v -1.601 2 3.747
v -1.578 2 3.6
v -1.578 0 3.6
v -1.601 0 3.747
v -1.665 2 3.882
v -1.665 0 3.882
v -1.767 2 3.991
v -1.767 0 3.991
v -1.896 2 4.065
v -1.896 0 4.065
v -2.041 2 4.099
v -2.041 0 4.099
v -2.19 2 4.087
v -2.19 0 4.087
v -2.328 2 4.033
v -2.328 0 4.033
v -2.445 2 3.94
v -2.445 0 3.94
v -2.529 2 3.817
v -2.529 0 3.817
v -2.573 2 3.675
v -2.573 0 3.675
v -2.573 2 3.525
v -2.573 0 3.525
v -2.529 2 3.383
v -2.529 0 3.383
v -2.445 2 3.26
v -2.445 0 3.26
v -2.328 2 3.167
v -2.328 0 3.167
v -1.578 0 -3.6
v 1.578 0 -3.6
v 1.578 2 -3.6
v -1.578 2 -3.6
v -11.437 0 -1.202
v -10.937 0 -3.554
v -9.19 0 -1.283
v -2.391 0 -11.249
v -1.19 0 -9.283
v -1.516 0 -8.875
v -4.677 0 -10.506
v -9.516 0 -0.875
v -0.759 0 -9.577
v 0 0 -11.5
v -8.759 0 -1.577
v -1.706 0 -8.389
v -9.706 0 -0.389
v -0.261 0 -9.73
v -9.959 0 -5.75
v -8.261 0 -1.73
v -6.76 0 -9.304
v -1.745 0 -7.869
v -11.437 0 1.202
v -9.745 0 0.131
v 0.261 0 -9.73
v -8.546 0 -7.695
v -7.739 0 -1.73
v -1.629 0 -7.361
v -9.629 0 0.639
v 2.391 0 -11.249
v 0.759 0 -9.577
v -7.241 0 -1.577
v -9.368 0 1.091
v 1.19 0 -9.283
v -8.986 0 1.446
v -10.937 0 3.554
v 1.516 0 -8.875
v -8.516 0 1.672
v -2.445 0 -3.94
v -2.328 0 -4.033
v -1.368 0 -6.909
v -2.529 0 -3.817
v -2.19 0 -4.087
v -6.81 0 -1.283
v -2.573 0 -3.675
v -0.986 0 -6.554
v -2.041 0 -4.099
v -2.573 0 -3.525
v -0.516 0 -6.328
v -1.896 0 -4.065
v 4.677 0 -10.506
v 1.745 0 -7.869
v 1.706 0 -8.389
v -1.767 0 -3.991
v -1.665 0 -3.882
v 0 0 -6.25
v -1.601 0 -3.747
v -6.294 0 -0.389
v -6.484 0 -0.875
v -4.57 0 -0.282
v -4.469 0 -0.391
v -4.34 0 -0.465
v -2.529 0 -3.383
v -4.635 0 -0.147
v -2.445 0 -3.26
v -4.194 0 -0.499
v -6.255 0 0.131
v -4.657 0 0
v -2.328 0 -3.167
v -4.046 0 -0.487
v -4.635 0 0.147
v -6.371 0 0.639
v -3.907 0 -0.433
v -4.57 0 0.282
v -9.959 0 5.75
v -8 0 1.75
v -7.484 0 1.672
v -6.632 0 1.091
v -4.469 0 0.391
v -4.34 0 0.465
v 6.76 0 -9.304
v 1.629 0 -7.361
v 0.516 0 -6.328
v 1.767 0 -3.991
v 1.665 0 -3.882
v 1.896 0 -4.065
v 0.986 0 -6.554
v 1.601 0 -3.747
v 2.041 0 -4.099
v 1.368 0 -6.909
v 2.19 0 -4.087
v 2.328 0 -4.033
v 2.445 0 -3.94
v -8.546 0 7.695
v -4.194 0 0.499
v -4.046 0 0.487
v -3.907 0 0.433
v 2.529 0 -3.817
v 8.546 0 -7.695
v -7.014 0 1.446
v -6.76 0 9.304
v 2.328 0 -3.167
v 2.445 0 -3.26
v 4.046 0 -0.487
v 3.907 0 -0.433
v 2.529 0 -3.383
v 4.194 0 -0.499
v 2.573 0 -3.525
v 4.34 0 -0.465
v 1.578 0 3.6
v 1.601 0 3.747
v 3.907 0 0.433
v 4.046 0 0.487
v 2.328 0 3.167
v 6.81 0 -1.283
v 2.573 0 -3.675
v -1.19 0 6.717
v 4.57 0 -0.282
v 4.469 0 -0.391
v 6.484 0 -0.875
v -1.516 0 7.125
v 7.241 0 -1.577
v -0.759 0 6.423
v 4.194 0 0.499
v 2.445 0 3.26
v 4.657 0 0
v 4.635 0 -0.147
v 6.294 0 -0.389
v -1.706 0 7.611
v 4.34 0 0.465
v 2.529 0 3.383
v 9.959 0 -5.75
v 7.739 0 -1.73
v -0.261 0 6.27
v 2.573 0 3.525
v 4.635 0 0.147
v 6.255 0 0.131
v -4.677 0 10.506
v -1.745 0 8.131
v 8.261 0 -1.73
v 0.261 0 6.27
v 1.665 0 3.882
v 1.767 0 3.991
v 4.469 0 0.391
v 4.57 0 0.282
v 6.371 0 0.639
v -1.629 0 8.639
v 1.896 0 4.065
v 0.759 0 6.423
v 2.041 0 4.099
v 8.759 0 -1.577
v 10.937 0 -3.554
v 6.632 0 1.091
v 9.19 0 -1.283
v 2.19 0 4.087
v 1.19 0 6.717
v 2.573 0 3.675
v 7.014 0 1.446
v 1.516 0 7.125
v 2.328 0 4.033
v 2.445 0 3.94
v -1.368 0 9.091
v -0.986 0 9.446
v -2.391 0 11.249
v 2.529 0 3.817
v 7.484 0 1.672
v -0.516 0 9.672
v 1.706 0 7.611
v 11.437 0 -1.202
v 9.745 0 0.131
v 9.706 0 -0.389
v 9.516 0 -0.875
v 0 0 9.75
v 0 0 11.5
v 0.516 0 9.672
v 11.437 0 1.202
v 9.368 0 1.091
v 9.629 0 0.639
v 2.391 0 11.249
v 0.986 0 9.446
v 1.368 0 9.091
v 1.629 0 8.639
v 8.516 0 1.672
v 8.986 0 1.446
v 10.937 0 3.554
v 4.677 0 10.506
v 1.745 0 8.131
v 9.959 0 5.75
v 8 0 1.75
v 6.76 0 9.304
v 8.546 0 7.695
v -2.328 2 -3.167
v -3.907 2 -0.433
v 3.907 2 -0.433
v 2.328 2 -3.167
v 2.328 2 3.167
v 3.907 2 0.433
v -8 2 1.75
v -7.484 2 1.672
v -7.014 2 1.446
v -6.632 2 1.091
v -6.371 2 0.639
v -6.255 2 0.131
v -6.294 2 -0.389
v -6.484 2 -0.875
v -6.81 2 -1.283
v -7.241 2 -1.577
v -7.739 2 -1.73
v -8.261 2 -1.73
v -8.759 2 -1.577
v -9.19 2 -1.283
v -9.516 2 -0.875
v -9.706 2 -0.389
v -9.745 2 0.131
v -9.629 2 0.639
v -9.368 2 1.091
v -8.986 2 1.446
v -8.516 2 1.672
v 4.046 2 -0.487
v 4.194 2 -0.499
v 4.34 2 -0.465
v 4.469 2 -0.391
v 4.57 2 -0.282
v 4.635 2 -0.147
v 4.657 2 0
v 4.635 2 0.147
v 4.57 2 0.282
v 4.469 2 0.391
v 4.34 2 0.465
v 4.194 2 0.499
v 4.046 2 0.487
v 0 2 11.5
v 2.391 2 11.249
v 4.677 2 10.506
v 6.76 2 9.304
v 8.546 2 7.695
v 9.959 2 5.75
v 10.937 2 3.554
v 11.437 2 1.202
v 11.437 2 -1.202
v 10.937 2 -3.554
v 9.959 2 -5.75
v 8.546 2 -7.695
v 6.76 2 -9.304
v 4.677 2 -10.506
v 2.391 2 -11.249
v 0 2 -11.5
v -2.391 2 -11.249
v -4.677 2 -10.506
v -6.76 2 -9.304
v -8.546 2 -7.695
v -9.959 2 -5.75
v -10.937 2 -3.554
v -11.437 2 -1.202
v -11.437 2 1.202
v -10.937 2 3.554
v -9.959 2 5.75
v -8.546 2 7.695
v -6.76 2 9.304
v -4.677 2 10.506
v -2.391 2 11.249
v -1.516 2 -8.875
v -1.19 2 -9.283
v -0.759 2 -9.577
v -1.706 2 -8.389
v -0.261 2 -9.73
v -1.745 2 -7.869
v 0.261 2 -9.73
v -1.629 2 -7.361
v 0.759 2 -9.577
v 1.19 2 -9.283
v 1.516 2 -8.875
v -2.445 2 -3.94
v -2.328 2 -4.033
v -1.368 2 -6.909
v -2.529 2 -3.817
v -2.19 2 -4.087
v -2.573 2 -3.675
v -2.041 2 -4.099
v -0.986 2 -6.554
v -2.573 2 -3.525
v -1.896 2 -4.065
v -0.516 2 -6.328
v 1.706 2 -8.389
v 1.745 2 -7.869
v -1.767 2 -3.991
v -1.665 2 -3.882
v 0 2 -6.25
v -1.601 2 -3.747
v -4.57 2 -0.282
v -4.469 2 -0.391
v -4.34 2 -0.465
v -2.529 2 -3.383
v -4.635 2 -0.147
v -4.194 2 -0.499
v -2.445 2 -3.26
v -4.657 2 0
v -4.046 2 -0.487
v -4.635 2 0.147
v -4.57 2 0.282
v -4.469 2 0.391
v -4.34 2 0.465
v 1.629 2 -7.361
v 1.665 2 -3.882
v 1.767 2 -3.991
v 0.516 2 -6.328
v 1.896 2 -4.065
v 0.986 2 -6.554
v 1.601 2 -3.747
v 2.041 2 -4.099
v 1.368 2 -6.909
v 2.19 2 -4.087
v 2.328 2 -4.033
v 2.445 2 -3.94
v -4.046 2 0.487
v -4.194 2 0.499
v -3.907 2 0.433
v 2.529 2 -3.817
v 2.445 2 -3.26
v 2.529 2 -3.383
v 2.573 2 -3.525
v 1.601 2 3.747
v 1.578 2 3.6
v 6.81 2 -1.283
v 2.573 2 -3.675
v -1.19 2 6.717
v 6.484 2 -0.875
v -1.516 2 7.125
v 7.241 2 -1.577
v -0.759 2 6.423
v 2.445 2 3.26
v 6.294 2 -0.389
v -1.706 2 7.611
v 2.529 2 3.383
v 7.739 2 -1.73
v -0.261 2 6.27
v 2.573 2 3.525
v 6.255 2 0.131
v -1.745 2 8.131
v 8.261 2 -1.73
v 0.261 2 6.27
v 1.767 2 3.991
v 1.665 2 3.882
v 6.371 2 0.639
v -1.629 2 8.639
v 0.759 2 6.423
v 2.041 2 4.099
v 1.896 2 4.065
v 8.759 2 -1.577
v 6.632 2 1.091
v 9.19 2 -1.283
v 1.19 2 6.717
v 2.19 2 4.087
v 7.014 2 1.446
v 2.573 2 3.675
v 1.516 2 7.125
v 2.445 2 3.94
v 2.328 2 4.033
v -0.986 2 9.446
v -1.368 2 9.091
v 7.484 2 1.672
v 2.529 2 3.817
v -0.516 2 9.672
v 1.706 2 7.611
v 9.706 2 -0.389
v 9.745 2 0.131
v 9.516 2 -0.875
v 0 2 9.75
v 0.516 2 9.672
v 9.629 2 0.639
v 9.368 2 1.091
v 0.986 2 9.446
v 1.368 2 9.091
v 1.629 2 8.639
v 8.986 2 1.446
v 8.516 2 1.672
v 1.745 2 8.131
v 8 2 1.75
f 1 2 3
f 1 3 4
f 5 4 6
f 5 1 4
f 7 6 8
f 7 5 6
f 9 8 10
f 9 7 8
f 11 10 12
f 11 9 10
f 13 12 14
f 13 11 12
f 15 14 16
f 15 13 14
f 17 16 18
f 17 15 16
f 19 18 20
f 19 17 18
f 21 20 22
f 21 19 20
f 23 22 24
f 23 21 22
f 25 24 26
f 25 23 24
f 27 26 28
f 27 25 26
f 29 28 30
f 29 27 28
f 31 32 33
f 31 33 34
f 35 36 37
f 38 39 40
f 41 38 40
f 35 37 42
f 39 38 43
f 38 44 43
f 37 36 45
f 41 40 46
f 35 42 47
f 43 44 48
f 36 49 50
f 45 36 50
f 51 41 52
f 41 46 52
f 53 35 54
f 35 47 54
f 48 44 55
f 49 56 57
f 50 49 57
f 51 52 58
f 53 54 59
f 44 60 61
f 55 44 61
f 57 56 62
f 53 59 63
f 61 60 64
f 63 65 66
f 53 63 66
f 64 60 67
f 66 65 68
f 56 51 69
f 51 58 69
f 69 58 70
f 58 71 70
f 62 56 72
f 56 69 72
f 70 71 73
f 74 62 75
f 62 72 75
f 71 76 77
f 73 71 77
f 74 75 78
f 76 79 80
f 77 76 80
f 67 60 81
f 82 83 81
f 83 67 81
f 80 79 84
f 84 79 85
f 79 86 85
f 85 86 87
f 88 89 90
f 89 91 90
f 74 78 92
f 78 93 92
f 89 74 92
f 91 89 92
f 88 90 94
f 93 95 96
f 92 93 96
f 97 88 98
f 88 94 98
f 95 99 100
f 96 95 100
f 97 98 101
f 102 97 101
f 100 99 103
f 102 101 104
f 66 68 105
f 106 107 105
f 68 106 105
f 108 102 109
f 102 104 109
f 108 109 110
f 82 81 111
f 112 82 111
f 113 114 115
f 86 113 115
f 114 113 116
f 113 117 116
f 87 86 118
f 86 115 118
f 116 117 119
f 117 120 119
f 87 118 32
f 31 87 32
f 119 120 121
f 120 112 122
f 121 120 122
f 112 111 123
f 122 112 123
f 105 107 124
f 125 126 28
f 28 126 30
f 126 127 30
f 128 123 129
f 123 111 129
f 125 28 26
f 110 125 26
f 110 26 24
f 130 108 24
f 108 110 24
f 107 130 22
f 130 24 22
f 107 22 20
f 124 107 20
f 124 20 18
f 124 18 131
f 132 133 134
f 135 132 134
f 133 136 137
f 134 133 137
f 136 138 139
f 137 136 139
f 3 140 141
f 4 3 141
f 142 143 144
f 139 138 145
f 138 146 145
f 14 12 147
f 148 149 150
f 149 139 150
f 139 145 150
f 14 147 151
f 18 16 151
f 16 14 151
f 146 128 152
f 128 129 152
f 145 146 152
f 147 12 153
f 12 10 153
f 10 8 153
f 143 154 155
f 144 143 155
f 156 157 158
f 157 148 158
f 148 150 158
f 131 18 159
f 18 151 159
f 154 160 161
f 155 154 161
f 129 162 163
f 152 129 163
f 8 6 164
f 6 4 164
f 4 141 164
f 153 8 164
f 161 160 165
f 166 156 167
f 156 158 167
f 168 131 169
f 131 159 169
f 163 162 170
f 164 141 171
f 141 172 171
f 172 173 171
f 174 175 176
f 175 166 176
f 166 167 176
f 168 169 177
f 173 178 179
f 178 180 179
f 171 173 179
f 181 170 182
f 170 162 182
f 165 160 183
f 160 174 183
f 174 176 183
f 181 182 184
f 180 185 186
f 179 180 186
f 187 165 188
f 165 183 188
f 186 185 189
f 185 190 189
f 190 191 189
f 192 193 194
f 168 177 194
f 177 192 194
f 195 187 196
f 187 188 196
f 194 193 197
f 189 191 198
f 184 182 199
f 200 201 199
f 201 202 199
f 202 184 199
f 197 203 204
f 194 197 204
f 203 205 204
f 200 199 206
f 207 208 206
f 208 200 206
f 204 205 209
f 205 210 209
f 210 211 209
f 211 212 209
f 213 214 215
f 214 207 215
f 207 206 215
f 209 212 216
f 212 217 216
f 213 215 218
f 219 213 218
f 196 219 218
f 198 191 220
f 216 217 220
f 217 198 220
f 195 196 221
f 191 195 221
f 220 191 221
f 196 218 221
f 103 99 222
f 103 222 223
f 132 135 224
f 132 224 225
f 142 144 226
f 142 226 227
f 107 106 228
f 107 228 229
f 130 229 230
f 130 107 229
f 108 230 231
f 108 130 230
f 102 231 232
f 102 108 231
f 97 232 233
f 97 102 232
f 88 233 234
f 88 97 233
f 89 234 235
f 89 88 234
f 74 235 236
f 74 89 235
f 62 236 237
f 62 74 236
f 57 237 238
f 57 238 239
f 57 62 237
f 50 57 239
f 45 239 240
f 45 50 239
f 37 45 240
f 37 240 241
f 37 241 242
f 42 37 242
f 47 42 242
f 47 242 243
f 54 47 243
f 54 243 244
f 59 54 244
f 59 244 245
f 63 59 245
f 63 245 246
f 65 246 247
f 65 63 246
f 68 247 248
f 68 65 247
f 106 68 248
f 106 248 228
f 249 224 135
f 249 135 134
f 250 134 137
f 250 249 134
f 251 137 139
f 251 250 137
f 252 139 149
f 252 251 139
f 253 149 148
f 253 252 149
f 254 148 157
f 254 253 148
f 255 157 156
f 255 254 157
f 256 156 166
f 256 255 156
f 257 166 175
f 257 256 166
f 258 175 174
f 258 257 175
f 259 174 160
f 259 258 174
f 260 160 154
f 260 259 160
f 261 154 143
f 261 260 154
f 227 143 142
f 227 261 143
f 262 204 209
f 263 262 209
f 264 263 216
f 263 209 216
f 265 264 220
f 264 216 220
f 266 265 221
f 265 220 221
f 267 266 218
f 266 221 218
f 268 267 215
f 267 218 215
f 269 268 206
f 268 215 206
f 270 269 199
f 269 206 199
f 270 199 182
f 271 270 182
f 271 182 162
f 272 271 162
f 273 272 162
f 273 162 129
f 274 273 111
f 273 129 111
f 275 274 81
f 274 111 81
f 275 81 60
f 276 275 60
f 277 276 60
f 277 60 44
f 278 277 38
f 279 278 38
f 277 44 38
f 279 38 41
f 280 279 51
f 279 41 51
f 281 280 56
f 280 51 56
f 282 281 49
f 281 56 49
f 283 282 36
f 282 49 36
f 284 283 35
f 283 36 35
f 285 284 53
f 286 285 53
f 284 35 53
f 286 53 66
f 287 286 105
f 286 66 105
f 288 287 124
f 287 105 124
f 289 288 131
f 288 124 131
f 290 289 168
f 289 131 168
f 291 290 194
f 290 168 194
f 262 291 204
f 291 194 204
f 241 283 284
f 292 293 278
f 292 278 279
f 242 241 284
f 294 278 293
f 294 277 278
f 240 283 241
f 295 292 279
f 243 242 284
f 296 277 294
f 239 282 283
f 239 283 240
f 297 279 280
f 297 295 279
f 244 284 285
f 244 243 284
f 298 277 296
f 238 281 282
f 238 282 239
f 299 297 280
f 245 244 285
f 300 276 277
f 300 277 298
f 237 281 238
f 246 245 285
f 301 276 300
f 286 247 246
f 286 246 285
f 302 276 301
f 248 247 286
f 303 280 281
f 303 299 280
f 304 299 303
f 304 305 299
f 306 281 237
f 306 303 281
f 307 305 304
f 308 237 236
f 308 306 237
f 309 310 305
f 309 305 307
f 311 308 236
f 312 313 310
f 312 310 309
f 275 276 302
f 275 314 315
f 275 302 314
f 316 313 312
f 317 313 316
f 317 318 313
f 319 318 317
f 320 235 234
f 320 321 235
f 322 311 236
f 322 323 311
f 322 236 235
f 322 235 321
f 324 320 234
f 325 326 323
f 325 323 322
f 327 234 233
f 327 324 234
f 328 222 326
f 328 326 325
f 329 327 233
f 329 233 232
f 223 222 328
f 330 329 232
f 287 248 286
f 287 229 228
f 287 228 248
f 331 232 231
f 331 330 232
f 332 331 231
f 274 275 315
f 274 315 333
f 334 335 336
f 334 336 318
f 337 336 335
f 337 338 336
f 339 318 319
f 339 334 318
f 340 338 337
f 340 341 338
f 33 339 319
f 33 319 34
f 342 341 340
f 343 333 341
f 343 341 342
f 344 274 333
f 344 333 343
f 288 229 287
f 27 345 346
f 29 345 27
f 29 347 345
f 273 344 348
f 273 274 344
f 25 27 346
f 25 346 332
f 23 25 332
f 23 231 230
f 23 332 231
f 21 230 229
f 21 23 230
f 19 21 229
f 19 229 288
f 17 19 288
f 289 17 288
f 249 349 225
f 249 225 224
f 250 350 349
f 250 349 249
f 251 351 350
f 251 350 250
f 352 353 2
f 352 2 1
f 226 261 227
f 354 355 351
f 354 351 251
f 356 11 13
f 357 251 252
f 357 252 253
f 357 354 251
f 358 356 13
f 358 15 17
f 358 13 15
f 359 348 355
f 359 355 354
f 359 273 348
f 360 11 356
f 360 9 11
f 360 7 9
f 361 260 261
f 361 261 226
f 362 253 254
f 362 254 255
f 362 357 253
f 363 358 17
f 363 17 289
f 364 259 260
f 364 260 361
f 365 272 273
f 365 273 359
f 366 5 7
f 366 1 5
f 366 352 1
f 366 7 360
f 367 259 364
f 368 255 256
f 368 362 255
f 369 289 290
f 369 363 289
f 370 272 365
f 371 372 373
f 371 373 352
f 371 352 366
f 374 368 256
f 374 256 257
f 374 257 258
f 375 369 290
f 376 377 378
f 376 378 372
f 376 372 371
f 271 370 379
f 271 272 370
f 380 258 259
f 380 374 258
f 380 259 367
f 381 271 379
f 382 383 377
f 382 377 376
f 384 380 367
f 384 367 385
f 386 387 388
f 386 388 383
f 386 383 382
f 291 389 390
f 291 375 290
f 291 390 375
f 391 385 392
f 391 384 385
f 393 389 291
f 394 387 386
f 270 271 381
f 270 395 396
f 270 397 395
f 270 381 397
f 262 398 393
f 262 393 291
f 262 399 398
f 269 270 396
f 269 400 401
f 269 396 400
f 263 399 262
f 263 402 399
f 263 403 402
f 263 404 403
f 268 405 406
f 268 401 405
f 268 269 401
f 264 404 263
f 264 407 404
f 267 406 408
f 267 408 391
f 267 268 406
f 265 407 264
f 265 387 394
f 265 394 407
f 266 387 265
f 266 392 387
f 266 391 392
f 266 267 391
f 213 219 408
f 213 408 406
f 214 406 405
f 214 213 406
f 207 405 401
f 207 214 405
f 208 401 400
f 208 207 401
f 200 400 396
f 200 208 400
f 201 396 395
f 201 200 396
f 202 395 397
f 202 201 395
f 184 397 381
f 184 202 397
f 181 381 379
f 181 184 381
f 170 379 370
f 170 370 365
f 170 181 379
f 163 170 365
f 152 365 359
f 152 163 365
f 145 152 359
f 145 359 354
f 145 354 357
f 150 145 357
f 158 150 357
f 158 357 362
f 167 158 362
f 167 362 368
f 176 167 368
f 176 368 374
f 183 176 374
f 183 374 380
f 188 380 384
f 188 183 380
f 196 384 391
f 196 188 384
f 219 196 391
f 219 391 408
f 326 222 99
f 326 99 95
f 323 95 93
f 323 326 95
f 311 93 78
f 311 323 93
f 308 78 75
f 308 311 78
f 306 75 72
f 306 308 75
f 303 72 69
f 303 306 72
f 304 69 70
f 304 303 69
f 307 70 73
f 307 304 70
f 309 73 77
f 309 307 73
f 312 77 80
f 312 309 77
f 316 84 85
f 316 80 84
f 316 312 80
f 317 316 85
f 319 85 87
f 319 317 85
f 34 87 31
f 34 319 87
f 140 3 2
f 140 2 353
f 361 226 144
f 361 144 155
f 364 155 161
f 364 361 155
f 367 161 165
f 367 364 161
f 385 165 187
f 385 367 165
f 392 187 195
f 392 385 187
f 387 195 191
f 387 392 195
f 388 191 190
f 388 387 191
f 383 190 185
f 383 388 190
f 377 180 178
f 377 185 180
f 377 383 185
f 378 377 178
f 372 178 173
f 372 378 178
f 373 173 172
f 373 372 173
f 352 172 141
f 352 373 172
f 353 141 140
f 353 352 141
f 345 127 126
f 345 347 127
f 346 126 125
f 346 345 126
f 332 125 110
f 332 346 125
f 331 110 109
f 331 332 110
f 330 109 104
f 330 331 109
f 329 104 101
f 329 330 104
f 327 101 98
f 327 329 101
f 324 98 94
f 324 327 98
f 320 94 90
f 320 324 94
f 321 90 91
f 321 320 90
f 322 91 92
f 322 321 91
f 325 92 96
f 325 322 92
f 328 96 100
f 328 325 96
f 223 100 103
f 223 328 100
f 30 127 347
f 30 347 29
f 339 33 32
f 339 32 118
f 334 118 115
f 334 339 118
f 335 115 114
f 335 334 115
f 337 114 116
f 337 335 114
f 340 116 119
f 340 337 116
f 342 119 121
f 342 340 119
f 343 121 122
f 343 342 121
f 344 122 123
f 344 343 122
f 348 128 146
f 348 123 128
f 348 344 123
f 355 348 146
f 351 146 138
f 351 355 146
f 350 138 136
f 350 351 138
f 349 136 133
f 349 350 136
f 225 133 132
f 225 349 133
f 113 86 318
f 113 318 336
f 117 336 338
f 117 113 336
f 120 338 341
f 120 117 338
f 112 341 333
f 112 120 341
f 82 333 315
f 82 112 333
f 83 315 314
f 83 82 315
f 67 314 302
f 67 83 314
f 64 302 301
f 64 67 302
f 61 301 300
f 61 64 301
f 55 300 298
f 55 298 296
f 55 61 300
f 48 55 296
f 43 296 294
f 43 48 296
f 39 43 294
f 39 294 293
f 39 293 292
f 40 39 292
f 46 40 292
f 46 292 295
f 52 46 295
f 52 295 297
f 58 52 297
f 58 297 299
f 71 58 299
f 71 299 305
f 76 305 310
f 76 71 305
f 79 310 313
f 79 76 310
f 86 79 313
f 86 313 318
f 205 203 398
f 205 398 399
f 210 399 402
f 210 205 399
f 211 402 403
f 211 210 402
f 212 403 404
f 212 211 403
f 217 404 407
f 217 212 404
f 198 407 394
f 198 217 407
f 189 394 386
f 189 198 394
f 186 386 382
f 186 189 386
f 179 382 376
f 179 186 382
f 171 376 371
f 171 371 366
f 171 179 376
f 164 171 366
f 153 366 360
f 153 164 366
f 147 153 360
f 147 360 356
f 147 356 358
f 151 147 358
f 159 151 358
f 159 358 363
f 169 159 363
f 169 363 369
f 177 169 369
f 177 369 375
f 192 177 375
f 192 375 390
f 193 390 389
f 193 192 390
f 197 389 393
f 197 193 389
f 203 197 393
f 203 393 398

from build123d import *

# Parameters (mm, degrees)
SKETCH1_R               = 11.5
SKETCH1_R_2             = 1.75
BOSS_EXTRUDE1_DEPTH     = 2
CUT_EXTRUDE1_DEPTH      = 17.385969608
CUT_EXTRUDE1_DEPTH_BACK = 17.385969608
SKETCH2_R               = 0.5


with BuildPart() as part:
    # Sketch1 → Boss-Extrude1 (new body)
    with BuildSketch(Plane(origin=(0, 0, 0), x_dir=(1, 0, 0), z_dir=(0, 1, 0))):
        with Locations(Location((0, 0, 0), (0, 0, 270))):
            Circle(SKETCH1_R)
        with Locations(Location((0, 8, 0), (0, 0, 270))):
            Circle(SKETCH1_R_2, mode=Mode.SUBTRACT)
        with Locations(Location((8, 0, 0), (0, 0, 270))):
            Circle(SKETCH1_R_2, mode=Mode.SUBTRACT)
        with Locations(Location((0, -8, 0), (0, 0, 270))):
            Circle(SKETCH1_R_2, mode=Mode.SUBTRACT)
        with Locations(Location((-8, 0, 0), (0, 0, 270))):
            Circle(SKETCH1_R_2, mode=Mode.SUBTRACT)
        Polygon((2.078460969, 3.6), (-2.078460969, 3.6), (-4.156921938, 0), (-2.078460969, -3.6), (2.078460969, -3.6), (4.156921938, 0), align=None, mode=Mode.SUBTRACT)
    extrude(amount=BOSS_EXTRUDE1_DEPTH)

    # Sketch2 → Cut-Extrude1 (cut, two sides: drawn at the far end of the back side and taken through both)
    with BuildSketch(Plane.XZ.offset(-CUT_EXTRUDE1_DEPTH_BACK)):
        with Locations((-2.078460969, 3.6)):
            Circle(SKETCH2_R)
        with Locations((2.078460969, 3.6)):
            Circle(SKETCH2_R)
        with Locations((4.156921938, 0)):
            Circle(SKETCH2_R)
        with Locations((2.078460969, -3.6)):
            Circle(SKETCH2_R)
        with Locations((-2.078460969, -3.6)):
            Circle(SKETCH2_R)
        with Locations((-4.156921938, 0)):
            Circle(SKETCH2_R)
    extrude(amount=CUT_EXTRUDE1_DEPTH + CUT_EXTRUDE1_DEPTH_BACK, mode=Mode.SUBTRACT)


solid = part.part
